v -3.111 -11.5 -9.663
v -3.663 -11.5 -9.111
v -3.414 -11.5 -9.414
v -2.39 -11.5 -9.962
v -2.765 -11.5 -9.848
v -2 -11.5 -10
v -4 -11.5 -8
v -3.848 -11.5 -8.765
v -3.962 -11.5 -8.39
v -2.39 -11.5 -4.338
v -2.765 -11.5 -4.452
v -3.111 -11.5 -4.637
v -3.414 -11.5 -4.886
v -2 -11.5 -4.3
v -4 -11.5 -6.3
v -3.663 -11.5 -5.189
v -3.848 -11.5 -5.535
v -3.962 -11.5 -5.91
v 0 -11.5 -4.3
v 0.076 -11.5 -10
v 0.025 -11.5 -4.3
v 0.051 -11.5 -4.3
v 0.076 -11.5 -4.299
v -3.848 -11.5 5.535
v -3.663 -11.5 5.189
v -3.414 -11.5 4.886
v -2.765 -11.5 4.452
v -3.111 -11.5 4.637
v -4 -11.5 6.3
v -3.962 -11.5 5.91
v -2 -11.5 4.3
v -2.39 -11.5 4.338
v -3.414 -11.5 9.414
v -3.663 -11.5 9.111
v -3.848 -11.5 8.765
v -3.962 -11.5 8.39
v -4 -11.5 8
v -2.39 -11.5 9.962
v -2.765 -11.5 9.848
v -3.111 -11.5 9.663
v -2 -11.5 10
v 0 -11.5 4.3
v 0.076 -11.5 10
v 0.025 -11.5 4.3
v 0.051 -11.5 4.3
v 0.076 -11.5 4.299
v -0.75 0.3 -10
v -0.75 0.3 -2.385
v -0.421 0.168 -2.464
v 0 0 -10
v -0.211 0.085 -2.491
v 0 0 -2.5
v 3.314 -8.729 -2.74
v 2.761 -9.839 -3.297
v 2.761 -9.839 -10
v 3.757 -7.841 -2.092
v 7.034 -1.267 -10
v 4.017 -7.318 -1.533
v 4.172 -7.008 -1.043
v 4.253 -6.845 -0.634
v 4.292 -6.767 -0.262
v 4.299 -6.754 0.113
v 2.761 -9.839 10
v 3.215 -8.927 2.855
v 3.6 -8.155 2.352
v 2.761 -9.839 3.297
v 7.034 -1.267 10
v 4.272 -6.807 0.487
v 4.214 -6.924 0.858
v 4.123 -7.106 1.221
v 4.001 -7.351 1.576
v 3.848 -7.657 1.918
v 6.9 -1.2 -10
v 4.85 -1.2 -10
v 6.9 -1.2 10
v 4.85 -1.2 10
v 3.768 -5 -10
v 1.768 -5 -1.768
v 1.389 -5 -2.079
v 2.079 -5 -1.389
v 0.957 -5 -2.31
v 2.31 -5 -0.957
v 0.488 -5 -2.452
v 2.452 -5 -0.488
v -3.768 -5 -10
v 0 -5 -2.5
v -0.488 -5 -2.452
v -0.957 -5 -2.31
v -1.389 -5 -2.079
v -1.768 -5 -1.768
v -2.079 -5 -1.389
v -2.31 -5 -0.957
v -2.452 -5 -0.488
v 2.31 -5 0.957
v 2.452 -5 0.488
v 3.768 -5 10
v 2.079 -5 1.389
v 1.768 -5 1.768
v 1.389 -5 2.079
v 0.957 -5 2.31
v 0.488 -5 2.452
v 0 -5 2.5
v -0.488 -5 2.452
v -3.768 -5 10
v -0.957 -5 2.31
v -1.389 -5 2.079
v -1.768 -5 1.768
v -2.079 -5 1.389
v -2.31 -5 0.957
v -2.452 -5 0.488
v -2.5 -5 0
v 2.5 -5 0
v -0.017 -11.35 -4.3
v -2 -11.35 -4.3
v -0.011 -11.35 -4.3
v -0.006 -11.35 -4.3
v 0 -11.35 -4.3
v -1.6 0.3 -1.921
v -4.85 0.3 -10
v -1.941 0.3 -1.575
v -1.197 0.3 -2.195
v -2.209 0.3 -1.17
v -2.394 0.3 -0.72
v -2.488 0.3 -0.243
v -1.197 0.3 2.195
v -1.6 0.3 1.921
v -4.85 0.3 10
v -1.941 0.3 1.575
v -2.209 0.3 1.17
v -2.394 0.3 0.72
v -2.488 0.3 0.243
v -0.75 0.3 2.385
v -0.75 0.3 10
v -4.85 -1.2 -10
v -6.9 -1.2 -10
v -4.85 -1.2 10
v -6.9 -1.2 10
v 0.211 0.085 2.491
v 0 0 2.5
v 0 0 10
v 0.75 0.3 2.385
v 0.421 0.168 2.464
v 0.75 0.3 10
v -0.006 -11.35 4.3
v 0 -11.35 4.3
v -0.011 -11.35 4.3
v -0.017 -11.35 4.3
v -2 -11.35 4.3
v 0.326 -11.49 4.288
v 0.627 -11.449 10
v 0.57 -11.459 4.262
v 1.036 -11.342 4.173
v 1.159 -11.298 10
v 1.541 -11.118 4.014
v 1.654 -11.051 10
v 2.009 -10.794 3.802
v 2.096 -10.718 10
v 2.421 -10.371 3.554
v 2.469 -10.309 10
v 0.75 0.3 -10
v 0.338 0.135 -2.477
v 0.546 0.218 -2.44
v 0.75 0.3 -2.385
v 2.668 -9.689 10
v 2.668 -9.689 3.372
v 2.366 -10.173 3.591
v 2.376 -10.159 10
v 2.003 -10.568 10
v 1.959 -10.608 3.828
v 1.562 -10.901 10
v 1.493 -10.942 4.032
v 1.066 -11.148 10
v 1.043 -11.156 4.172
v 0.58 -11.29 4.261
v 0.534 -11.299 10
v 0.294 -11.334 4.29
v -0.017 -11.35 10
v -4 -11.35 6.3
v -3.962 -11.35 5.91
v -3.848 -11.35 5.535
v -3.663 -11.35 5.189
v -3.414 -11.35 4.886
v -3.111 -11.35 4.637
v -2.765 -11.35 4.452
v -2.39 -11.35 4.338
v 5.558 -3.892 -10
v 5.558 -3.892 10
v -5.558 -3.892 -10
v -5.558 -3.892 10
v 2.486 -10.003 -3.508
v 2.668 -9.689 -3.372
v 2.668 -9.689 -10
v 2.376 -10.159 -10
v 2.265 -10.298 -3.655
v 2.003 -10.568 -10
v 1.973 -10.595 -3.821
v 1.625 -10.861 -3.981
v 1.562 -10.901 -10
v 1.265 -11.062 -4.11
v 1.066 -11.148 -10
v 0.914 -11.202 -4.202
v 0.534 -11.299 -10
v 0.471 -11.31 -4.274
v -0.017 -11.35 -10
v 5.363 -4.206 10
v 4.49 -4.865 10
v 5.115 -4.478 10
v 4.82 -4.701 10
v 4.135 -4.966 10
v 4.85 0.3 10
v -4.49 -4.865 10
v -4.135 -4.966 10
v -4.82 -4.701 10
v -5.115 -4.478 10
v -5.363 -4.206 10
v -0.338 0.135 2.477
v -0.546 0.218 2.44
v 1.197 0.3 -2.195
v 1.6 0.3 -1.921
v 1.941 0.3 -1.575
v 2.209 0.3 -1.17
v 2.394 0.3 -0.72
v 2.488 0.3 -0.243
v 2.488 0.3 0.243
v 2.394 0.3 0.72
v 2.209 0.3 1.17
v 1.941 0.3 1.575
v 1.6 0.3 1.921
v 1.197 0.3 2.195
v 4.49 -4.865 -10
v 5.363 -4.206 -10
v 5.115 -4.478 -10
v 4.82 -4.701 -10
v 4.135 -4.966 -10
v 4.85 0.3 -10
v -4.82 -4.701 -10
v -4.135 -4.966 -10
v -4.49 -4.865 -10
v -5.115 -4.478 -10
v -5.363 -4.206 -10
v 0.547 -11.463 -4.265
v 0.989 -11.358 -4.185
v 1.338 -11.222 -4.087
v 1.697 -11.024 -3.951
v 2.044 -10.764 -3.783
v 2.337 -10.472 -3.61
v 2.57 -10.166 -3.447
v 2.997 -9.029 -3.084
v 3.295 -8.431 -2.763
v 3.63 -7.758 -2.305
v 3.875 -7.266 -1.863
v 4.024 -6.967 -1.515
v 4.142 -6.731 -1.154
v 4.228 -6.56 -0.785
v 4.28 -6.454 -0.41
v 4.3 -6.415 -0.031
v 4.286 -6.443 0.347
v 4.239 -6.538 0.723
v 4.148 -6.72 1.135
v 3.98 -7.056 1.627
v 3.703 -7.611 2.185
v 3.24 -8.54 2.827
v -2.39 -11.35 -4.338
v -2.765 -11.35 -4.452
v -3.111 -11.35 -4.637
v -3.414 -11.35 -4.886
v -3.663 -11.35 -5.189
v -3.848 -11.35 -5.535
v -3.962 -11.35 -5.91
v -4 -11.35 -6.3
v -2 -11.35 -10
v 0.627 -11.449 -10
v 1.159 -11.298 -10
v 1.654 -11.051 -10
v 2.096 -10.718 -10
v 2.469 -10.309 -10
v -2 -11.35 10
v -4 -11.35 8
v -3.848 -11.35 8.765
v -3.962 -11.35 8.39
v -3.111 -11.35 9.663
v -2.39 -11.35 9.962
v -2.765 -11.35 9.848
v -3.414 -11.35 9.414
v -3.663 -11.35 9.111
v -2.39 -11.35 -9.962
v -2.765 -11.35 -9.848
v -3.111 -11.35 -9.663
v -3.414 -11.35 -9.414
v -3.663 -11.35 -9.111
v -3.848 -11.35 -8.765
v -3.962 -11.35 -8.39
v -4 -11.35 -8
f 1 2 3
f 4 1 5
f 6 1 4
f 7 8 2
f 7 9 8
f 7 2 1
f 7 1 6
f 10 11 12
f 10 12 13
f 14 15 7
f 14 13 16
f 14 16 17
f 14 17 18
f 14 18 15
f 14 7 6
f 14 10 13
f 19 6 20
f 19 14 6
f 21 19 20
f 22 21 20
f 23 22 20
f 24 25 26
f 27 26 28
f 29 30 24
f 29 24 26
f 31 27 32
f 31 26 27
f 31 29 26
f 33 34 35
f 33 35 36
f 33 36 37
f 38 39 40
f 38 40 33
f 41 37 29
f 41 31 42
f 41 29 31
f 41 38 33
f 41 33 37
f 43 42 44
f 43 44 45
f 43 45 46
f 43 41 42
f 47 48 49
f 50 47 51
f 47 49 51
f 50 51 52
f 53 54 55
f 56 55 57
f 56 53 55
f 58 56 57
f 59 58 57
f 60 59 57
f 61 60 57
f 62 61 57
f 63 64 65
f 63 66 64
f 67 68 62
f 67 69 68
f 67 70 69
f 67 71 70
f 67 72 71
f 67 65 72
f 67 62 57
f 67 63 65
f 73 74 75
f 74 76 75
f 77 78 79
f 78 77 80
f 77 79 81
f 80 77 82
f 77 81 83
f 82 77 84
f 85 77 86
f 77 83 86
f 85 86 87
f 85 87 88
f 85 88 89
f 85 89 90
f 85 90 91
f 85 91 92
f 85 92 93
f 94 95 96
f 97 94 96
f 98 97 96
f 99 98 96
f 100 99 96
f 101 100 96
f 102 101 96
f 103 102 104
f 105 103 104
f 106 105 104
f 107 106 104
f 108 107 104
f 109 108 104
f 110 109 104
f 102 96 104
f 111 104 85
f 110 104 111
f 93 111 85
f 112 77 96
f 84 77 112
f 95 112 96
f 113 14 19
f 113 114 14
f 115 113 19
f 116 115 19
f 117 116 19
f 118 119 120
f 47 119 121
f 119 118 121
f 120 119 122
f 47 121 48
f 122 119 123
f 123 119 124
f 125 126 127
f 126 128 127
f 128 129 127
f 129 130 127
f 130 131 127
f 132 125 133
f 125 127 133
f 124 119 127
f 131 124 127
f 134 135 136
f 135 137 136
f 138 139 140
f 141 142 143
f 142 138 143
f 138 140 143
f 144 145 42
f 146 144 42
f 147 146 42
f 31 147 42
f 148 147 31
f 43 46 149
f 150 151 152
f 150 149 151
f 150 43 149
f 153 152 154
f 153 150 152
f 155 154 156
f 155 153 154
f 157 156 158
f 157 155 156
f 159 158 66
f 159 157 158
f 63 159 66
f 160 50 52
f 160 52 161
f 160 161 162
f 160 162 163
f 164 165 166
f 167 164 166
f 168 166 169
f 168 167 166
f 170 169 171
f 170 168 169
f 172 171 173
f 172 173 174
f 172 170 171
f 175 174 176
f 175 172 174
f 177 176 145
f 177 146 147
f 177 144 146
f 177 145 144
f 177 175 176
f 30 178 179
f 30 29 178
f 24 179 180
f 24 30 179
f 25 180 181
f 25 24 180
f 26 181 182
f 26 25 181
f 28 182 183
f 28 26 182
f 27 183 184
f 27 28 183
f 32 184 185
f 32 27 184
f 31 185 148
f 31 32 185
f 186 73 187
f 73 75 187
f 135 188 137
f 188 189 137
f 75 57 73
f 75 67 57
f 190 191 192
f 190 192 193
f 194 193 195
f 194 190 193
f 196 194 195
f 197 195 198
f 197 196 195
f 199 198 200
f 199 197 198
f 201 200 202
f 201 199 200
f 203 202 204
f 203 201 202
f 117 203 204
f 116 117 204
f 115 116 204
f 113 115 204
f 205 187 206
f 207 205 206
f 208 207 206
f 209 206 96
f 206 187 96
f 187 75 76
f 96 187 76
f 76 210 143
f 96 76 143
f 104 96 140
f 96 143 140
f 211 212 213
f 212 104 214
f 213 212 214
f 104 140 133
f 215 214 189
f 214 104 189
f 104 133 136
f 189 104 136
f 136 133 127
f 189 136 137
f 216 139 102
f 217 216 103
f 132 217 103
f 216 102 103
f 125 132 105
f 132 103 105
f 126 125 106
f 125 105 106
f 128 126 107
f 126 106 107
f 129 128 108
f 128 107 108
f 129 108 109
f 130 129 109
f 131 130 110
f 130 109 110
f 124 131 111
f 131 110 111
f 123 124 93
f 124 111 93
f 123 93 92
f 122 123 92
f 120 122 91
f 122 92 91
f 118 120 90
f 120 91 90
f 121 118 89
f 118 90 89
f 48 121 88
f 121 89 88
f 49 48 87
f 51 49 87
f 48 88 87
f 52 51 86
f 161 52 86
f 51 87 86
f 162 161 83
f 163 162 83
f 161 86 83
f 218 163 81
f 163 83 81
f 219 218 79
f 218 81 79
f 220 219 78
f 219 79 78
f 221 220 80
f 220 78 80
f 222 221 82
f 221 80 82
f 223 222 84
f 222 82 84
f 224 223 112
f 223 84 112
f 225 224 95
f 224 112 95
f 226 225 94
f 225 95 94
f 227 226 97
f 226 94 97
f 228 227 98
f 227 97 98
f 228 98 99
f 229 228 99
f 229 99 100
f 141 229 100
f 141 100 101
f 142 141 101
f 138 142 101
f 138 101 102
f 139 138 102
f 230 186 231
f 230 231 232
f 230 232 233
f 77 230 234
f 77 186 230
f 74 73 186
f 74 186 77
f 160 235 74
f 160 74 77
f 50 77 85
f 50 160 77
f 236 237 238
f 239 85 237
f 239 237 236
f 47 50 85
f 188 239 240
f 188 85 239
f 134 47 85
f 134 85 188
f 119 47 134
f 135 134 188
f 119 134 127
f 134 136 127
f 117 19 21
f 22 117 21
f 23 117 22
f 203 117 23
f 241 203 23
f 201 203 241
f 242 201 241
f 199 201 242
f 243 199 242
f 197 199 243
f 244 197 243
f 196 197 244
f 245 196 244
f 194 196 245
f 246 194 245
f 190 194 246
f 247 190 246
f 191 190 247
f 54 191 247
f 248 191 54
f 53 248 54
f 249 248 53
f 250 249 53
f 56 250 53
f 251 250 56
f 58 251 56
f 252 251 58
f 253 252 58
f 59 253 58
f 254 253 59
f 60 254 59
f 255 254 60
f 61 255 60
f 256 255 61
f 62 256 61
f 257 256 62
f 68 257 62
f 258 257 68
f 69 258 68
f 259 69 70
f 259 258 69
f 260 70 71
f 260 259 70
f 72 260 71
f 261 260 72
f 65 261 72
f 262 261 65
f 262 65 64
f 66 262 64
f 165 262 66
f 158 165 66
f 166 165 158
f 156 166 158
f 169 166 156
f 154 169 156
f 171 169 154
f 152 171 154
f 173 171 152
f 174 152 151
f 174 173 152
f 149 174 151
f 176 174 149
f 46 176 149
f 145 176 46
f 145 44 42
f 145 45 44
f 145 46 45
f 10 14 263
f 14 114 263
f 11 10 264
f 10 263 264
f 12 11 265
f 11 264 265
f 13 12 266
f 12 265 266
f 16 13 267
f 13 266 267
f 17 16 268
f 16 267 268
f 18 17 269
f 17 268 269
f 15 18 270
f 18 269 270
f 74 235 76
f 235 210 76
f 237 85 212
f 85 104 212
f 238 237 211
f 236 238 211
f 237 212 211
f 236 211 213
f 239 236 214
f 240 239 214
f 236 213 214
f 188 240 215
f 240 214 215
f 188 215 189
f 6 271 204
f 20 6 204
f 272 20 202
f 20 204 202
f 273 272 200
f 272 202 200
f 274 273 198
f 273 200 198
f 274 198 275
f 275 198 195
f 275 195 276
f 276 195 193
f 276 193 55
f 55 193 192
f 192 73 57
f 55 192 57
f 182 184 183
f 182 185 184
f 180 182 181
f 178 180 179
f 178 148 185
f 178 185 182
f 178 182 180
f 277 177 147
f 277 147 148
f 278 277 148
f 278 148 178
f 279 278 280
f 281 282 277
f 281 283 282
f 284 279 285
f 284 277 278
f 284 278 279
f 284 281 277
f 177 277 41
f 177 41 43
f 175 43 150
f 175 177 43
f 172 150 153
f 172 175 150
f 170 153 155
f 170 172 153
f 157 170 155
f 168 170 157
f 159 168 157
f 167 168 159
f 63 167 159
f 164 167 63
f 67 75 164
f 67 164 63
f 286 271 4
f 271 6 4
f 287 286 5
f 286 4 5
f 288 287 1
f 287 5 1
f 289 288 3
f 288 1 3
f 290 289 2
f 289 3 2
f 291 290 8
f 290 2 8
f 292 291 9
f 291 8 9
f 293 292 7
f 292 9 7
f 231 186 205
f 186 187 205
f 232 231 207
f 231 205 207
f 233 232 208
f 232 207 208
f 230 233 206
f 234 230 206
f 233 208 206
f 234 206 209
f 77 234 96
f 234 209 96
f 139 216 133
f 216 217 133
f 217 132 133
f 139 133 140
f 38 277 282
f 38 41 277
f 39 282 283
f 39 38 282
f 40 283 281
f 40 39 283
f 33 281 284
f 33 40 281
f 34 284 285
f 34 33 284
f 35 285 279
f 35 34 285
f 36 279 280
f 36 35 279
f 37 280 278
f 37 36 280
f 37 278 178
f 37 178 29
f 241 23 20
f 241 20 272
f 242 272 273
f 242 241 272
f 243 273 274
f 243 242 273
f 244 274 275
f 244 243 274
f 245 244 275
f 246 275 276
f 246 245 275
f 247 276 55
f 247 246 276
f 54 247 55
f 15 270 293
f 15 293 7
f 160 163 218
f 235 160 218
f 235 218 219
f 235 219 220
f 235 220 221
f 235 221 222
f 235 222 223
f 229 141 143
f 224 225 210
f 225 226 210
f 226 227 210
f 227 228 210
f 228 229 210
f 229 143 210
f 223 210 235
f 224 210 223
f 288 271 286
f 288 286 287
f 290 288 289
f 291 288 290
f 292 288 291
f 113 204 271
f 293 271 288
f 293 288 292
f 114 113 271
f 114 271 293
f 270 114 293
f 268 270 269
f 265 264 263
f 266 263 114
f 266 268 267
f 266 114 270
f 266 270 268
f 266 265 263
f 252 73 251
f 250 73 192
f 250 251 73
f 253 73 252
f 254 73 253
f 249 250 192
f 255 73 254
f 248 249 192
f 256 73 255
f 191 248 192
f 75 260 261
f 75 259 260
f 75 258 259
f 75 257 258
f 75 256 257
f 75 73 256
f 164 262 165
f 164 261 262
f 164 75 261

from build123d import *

# Parameters (mm, degrees)
EXTRUDE_1_DEPTH     = 10
EXTRUDE_2_DEPTH     = 10
CUT_EXTRUDE_1_DEPTH = 20
FILLET_1_R          = 2
SKETCH_4_W          = 2.5
SKETCH_4_H          = 11.8


with BuildPart() as part:
    # Эскиз1 → Бобышка-Вытянуть1 (new body, symmetric)
    with BuildSketch(Plane.XY):
        with BuildLine():
            Line((0, 0), (0.75, 0.3))
            Line((0.75, 0.3), (4.85, 0.3))
            Line((4.85, 0.3), (4.85, -1.2))
            Line((4.85, -1.2), (6.9, -1.2))
            Line((6.9, -1.2), (5.557621059, -3.892395626))
            ThreePointArc((5.557621059, -3.892395626), (4.820180183, -4.70070445), (3.767752336, -5))
            Line((3.767752336, -5), (-3.767752336, -5))
            ThreePointArc((-3.767752336, -5), (-4.820180183, -4.70070445), (-5.557621059, -3.892395626))
            Line((-5.557621059, -3.892395626), (-6.9, -1.2))
            Line((-6.9, -1.2), (-4.85, -1.2))
            Line((-4.85, -1.2), (-4.85, 0.3))
            Line((-4.85, 0.3), (-0.75, 0.3))
            Line((-0.75, 0.3), (0, 0))
        make_face()
    extrude(amount=EXTRUDE_1_DEPTH, both=True)

    # Эскиз4 → Отверстие обработанное метчиком M61 (revolve, cut)
    with BuildSketch(Plane(origin=(0, 0.3, 0), x_dir=(0, 0, 1), z_dir=(1, 0, 0))):
        with Locations((1.25, 5.9)):
            Rectangle(SKETCH_4_W, SKETCH_4_H)
    revolve(axis=Axis((0, 6.65, 0), (0, -1, 0)), mode=Mode.SUBTRACT)


with BuildPart() as body_2:
    # Эскиз2 → Бобышка-Вытянуть2 (new body, symmetric)
    with BuildSketch(Plane.XY):
        with BuildLine():
            Line((6.9, -1.2), (2.667743433, -9.688593439))
            ThreePointArc((2.667743433, -9.688593439), (1.561582119, -10.901056675), (-0.017059652, -11.35))
            Line((-0.017059652, -11.35), (-4, -11.35))
            Line((-4, -11.35), (-4, -11.5))
            Line((-4, -11.5), (0.075763165, -11.5))
            ThreePointArc((0.075763165, -11.5), (1.654404936, -11.051056675), (2.760566249, -9.838593439))
            Line((2.760566249, -9.838593439), (7.034240154, -1.266929672))
            Line((7.034240154, -1.266929672), (6.9, -1.2))
        make_face()
    extrude(amount=EXTRUDE_2_DEPTH, both=True)

    # Эскиз3 → Вырез-Вытянуть1 (cut)
    with BuildSketch(Plane.XZ.offset(5)):
        with BuildLine():
            Line((0, 4.3), (-5.557621059, 4.3))
            Line((-5.557621059, 4.3), (-5.557621059, -4.3))
            Line((-5.557621059, -4.3), (0, -4.3))
            ThreePointArc((0, -4.3), (4.3, 0), (0, 4.3))
        make_face()
    extrude(amount=CUT_EXTRUDE_1_DEPTH, mode=Mode.SUBTRACT)

    # Скругление1
    fillet_1_edges = [body_2.edges().sort_by_distance(p)[0] for p in [
        (-4, -11.425, 10),
        (-4, -11.425, 4.3),
        (-4, -11.425, -4.3),
        (-4, -11.425, -10),
    ]]
    fillet(fillet_1_edges, radius=FILLET_1_R)


solid = Compound([part.part, body_2.part])
